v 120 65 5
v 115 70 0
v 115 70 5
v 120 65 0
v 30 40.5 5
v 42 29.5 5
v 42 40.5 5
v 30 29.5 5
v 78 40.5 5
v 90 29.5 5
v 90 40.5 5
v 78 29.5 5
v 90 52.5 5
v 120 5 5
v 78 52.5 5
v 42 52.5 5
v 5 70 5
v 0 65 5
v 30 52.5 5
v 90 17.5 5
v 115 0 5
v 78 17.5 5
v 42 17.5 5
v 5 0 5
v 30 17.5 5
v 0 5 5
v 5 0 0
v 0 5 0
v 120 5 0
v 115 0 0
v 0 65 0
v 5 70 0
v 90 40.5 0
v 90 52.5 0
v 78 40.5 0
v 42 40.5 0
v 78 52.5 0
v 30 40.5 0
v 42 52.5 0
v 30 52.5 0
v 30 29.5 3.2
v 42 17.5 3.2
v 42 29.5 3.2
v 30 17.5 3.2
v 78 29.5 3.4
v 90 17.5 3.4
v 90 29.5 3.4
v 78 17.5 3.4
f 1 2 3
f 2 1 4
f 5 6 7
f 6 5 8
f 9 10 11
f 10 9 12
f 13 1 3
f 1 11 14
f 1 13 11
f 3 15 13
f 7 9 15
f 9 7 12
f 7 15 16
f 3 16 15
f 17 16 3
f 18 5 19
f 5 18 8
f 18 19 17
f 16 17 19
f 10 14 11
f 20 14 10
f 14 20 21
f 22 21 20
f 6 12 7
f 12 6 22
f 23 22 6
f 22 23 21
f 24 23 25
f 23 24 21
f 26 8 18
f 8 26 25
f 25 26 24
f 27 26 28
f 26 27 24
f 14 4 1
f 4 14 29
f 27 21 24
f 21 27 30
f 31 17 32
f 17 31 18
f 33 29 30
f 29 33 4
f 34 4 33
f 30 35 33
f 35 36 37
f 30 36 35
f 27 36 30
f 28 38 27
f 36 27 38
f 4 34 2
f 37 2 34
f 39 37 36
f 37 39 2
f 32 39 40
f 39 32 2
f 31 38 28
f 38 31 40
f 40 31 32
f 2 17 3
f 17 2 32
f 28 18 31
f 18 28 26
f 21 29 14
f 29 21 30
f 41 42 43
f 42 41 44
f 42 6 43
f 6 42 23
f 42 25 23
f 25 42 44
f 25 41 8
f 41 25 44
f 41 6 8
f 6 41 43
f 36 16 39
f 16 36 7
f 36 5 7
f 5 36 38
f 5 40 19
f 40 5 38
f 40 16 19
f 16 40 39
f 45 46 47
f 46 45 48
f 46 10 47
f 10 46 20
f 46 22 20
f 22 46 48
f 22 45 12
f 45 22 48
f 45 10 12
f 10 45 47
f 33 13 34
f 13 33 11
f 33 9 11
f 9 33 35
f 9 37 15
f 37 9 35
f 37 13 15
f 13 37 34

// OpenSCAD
$fn = 32;

// ----------------------------------------------------------------------
// Windowed plate: 4 voids, 120 x 70 x 5 mm
// ----------------------------------------------------------------------

// --- parameters (mm) ---
plate_l = 120;            // plate length, X
plate_w = 70;             // plate width, Y
plate_t = 5;              // plate thickness, Z
edge_margin = 12;         // wall from the plate edge to any window
win_l = 12;               // pocket length
win_w = 12;               // pocket width
pitch_x = 48;             // grid pitch along X
pitch_y = 23;             // grid pitch along Y
depth_1 = 1.8;            // depth of void 1 (full thickness = through)
depth_2 = 5;              // depth of void 2 (full thickness = through)
depth_3 = 1.6;            // depth of void 3 (full thickness = through)
depth_4 = 5;              // depth of void 4 (full thickness = through)
corner_c = 5;             // corner chamfer of the plate

profile = [[5, 0], [115, 0], [120, 5], [120, 65], [115, 70], [5, 70], [0, 65], [0, 5]];  // primary outline, 8 points, counter clockwise
void_1 = [[30, 17.5], [42, 17.5], [42, 29.5], [30, 29.5]];  // pocket at grid node 0,0, 4 points
void_2 = [[30, 40.5], [42, 40.5], [42, 52.5], [30, 52.5]];  // pocket at grid node 0,1, 4 points
void_3 = [[78, 17.5], [90, 17.5], [90, 29.5], [78, 29.5]];  // pocket at grid node 1,0, 4 points
void_4 = [[78, 40.5], [90, 40.5], [90, 52.5], [78, 52.5]];  // pocket at grid node 1,1, 4 points

// --- the one profile operation ---
difference() {
  linear_extrude(height = plate_t) polygon(points = profile);
  translate([0, 0, plate_t - depth_1])
    linear_extrude(height = depth_1 + 1) polygon(points = void_1);
  translate([0, 0, -1])
    linear_extrude(height = plate_t + 2) polygon(points = void_2);
  translate([0, 0, plate_t - depth_3])
    linear_extrude(height = depth_3 + 1) polygon(points = void_3);
  translate([0, 0, -1])
    linear_extrude(height = plate_t + 2) polygon(points = void_4);
}
